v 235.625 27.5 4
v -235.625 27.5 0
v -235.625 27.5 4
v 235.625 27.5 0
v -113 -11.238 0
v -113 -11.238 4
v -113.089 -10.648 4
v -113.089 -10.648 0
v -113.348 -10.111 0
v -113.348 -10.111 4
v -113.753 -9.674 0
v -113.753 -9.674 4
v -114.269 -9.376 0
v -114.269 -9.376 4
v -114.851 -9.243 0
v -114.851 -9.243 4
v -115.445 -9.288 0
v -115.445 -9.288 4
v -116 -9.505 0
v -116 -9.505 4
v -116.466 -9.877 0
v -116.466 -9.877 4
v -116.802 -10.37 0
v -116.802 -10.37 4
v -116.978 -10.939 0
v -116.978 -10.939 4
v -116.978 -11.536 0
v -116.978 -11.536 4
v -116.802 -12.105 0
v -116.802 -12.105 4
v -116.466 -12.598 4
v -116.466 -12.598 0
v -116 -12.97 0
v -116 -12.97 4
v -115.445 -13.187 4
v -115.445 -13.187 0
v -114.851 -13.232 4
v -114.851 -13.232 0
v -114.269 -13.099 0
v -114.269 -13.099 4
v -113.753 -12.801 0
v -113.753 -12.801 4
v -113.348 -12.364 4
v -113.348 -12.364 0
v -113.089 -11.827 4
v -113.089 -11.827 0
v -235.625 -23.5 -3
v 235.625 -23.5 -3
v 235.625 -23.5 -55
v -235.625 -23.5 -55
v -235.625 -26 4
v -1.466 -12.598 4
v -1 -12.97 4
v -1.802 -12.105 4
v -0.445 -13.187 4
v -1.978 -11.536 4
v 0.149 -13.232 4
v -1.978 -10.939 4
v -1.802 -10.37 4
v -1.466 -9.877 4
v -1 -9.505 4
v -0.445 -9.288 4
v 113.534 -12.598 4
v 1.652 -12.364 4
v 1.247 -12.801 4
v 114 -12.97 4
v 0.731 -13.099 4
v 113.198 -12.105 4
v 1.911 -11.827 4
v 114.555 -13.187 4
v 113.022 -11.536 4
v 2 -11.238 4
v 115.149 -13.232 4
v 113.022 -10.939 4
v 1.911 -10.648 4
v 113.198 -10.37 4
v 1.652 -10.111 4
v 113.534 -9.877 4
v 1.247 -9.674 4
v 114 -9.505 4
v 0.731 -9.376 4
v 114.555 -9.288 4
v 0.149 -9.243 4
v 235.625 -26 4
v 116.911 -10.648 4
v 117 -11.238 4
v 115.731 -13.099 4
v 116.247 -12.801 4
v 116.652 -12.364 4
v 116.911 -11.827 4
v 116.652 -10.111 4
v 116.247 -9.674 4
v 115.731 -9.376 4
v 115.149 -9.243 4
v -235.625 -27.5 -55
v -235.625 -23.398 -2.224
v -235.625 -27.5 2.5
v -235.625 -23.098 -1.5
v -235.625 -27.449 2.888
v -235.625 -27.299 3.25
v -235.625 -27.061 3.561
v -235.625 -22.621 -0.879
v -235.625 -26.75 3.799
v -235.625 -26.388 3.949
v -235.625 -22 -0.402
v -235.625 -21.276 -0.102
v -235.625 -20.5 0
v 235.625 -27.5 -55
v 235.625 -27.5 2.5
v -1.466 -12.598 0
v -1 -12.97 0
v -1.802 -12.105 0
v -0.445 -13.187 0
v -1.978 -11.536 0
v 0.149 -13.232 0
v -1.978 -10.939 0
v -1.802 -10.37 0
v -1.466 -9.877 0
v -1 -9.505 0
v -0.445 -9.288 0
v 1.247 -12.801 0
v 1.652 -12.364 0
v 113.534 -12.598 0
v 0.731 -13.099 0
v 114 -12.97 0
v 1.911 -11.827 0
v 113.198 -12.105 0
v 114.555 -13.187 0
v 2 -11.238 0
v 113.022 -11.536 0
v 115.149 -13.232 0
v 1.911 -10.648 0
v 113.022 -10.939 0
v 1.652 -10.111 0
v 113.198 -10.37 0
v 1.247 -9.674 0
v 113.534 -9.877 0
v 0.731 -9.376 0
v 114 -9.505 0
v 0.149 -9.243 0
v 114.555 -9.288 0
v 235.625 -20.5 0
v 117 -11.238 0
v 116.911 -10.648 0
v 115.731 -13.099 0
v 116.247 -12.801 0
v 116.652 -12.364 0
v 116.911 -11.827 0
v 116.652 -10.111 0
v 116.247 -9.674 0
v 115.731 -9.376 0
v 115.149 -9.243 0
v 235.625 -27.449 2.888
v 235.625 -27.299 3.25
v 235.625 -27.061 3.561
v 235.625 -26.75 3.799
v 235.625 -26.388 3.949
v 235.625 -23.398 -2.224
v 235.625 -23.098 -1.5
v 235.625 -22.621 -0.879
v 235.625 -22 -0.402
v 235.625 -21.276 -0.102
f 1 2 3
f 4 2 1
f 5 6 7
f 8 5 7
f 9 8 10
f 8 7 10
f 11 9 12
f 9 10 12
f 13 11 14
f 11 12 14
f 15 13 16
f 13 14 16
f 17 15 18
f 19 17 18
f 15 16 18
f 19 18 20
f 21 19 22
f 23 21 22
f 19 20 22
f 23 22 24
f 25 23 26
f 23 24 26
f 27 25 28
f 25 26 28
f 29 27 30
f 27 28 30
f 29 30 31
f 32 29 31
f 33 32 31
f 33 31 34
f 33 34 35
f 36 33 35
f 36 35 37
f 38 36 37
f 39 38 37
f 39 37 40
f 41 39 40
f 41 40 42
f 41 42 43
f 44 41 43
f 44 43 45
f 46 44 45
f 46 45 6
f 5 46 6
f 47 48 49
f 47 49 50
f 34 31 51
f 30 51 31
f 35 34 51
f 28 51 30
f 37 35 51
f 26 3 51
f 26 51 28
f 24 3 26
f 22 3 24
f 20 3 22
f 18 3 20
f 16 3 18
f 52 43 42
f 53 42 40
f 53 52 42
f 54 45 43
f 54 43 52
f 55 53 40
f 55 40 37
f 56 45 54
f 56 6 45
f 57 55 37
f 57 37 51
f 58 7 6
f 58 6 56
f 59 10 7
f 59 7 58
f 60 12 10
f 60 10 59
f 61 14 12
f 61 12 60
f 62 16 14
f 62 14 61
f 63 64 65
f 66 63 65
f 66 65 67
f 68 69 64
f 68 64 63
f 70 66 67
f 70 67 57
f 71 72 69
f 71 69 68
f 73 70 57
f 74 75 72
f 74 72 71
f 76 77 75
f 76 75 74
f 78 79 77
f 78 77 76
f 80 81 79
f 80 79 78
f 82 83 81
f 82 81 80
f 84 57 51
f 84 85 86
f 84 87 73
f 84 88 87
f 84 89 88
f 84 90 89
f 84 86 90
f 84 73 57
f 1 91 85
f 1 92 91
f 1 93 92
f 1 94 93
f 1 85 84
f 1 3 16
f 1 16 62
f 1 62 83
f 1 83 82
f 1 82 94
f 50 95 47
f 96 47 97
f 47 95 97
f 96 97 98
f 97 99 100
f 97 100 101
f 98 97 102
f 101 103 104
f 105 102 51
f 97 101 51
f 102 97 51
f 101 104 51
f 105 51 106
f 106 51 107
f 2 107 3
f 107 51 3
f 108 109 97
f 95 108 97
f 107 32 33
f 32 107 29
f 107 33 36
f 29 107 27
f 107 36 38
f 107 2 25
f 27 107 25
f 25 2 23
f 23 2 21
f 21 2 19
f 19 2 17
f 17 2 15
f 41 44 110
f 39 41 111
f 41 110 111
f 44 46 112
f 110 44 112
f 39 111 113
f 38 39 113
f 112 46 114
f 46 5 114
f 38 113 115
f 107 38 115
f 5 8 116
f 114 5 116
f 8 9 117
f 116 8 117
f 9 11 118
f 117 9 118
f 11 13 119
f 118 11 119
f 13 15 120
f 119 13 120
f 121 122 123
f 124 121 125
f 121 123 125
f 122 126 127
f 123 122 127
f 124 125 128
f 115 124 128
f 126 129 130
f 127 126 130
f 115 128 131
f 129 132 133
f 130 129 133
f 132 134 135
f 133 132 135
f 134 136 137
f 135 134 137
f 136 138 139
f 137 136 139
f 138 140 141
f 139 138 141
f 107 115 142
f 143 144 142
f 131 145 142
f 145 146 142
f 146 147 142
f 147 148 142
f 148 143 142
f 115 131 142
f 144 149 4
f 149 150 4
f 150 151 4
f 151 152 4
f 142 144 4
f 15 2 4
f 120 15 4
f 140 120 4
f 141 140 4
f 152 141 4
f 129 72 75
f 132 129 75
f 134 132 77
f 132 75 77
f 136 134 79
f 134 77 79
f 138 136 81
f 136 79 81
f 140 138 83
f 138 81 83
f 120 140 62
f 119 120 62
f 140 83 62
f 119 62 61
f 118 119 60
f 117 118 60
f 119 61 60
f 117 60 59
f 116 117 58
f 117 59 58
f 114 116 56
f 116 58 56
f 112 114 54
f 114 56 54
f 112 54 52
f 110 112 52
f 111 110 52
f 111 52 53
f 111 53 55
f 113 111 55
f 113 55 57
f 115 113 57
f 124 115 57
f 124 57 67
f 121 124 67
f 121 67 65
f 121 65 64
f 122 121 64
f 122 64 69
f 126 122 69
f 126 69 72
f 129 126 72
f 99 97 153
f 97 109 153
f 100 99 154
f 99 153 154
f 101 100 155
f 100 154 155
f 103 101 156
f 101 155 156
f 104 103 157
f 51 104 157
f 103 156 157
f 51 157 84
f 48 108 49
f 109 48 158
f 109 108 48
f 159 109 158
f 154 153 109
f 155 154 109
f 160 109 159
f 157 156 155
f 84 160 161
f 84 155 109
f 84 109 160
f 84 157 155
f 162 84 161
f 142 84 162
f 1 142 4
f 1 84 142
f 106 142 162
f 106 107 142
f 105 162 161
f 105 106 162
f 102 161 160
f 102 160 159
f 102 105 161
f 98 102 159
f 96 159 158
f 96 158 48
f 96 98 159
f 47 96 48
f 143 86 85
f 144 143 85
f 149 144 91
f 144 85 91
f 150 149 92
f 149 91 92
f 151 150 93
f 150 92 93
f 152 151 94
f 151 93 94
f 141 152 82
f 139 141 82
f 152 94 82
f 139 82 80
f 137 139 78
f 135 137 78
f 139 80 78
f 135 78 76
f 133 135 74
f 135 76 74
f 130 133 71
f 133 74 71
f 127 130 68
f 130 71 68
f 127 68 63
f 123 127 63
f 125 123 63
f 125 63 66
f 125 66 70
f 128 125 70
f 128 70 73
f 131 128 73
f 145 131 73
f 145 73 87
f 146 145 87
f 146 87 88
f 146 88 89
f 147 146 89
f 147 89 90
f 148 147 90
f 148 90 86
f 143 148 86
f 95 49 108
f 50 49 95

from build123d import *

# Parameters (mm, degrees)
CROQUIS1_W              = 471.25
CROQUIS1_H              = 55
SALIENTE_EXTRUIR1_DEPTH = 4
CROQUIS2_W              = 471.25
CROQUIS2_H              = 4
SALIENTE_EXTRUIR2_DEPTH = 55
REDONDEO1_R             = 3
REDONDEO2_R             = 1.5
CORTAR_EXTRUIR1_REACH   = 246.451
CROQUIS3_R              = 2


with BuildPart() as part:
    # Croquis1 → Saliente-Extruir1 (new body)
    with BuildSketch(Plane.XY):
        Rectangle(CROQUIS1_W, CROQUIS1_H)
    extrude(amount=SALIENTE_EXTRUIR1_DEPTH)

    # Croquis2 → Saliente-Extruir2 (add)
    with BuildSketch(Plane(origin=(0, 0, 0), x_dir=(-1, 0, 0), z_dir=(0, 0, -1))):
        with Locations((0, -25.5)):
            Rectangle(CROQUIS2_W, CROQUIS2_H)
    extrude(amount=SALIENTE_EXTRUIR2_DEPTH)

    # Redondeo1
    redondeo1_edges = [part.edges().sort_by_distance(p)[0] for p in [
        (0, -23.5, 0),
    ]]
    fillet(redondeo1_edges, radius=REDONDEO1_R)

    # Redondeo2
    redondeo2_edges = [part.edges().sort_by_distance(p)[0] for p in [
        (0, -27.5, 4),
    ]]
    fillet(redondeo2_edges, radius=REDONDEO2_R)

    # Croquis3 → Cortar-Extruir1 (cut, up to next)
    with BuildSketch(Plane.XY.offset(4), mode=Mode.PRIVATE) as cortar_extruir1_sk1:
        with Locations((-115, -11.2375)):
            Circle(CROQUIS3_R)
    cortar_extruir1_tool1 = extrude(cortar_extruir1_sk1.sketch, amount=-CORTAR_EXTRUIR1_REACH, mode=Mode.PRIVATE) & part.part
    # Croquis3 → Cortar-Extruir1 (cut, up to next)
    with BuildSketch(Plane.XY.offset(4), mode=Mode.PRIVATE) as cortar_extruir1_sk2:
        with Locations((0, -11.2375)):
            Circle(CROQUIS3_R)
    cortar_extruir1_tool2 = extrude(cortar_extruir1_sk2.sketch, amount=-CORTAR_EXTRUIR1_REACH, mode=Mode.PRIVATE) & part.part
    # Croquis3 → Cortar-Extruir1 (cut, up to next)
    with BuildSketch(Plane.XY.offset(4), mode=Mode.PRIVATE) as cortar_extruir1_sk3:
        with Locations((115, -11.2375)):
            Circle(CROQUIS3_R)
    cortar_extruir1_tool3 = extrude(cortar_extruir1_sk3.sketch, amount=-CORTAR_EXTRUIR1_REACH, mode=Mode.PRIVATE) & part.part
    add(cortar_extruir1_tool1.solids().sort_by_distance((-115, -11.2375, 4))[0], mode=Mode.SUBTRACT)
    add(cortar_extruir1_tool2.solids().sort_by_distance((0, -11.2375, 4))[0], mode=Mode.SUBTRACT)
    add(cortar_extruir1_tool3.solids().sort_by_distance((115, -11.2375, 4))[0], mode=Mode.SUBTRACT)


solid = part.part
